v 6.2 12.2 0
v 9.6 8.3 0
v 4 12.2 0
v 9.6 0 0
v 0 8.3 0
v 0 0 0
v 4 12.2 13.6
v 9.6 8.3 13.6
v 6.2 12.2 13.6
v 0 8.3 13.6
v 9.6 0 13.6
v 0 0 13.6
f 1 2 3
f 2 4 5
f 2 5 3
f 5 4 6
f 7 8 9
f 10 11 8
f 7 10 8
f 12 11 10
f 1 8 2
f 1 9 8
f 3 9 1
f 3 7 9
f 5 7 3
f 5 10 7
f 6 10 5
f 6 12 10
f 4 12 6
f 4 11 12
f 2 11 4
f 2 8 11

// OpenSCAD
linear_extrude(height=13.6) {
  polygon([[0, 0], [0, 8.3], [4, 12.2], [6.2, 12.2], [9.6, 8.3], [9.6, 0]]);
}
